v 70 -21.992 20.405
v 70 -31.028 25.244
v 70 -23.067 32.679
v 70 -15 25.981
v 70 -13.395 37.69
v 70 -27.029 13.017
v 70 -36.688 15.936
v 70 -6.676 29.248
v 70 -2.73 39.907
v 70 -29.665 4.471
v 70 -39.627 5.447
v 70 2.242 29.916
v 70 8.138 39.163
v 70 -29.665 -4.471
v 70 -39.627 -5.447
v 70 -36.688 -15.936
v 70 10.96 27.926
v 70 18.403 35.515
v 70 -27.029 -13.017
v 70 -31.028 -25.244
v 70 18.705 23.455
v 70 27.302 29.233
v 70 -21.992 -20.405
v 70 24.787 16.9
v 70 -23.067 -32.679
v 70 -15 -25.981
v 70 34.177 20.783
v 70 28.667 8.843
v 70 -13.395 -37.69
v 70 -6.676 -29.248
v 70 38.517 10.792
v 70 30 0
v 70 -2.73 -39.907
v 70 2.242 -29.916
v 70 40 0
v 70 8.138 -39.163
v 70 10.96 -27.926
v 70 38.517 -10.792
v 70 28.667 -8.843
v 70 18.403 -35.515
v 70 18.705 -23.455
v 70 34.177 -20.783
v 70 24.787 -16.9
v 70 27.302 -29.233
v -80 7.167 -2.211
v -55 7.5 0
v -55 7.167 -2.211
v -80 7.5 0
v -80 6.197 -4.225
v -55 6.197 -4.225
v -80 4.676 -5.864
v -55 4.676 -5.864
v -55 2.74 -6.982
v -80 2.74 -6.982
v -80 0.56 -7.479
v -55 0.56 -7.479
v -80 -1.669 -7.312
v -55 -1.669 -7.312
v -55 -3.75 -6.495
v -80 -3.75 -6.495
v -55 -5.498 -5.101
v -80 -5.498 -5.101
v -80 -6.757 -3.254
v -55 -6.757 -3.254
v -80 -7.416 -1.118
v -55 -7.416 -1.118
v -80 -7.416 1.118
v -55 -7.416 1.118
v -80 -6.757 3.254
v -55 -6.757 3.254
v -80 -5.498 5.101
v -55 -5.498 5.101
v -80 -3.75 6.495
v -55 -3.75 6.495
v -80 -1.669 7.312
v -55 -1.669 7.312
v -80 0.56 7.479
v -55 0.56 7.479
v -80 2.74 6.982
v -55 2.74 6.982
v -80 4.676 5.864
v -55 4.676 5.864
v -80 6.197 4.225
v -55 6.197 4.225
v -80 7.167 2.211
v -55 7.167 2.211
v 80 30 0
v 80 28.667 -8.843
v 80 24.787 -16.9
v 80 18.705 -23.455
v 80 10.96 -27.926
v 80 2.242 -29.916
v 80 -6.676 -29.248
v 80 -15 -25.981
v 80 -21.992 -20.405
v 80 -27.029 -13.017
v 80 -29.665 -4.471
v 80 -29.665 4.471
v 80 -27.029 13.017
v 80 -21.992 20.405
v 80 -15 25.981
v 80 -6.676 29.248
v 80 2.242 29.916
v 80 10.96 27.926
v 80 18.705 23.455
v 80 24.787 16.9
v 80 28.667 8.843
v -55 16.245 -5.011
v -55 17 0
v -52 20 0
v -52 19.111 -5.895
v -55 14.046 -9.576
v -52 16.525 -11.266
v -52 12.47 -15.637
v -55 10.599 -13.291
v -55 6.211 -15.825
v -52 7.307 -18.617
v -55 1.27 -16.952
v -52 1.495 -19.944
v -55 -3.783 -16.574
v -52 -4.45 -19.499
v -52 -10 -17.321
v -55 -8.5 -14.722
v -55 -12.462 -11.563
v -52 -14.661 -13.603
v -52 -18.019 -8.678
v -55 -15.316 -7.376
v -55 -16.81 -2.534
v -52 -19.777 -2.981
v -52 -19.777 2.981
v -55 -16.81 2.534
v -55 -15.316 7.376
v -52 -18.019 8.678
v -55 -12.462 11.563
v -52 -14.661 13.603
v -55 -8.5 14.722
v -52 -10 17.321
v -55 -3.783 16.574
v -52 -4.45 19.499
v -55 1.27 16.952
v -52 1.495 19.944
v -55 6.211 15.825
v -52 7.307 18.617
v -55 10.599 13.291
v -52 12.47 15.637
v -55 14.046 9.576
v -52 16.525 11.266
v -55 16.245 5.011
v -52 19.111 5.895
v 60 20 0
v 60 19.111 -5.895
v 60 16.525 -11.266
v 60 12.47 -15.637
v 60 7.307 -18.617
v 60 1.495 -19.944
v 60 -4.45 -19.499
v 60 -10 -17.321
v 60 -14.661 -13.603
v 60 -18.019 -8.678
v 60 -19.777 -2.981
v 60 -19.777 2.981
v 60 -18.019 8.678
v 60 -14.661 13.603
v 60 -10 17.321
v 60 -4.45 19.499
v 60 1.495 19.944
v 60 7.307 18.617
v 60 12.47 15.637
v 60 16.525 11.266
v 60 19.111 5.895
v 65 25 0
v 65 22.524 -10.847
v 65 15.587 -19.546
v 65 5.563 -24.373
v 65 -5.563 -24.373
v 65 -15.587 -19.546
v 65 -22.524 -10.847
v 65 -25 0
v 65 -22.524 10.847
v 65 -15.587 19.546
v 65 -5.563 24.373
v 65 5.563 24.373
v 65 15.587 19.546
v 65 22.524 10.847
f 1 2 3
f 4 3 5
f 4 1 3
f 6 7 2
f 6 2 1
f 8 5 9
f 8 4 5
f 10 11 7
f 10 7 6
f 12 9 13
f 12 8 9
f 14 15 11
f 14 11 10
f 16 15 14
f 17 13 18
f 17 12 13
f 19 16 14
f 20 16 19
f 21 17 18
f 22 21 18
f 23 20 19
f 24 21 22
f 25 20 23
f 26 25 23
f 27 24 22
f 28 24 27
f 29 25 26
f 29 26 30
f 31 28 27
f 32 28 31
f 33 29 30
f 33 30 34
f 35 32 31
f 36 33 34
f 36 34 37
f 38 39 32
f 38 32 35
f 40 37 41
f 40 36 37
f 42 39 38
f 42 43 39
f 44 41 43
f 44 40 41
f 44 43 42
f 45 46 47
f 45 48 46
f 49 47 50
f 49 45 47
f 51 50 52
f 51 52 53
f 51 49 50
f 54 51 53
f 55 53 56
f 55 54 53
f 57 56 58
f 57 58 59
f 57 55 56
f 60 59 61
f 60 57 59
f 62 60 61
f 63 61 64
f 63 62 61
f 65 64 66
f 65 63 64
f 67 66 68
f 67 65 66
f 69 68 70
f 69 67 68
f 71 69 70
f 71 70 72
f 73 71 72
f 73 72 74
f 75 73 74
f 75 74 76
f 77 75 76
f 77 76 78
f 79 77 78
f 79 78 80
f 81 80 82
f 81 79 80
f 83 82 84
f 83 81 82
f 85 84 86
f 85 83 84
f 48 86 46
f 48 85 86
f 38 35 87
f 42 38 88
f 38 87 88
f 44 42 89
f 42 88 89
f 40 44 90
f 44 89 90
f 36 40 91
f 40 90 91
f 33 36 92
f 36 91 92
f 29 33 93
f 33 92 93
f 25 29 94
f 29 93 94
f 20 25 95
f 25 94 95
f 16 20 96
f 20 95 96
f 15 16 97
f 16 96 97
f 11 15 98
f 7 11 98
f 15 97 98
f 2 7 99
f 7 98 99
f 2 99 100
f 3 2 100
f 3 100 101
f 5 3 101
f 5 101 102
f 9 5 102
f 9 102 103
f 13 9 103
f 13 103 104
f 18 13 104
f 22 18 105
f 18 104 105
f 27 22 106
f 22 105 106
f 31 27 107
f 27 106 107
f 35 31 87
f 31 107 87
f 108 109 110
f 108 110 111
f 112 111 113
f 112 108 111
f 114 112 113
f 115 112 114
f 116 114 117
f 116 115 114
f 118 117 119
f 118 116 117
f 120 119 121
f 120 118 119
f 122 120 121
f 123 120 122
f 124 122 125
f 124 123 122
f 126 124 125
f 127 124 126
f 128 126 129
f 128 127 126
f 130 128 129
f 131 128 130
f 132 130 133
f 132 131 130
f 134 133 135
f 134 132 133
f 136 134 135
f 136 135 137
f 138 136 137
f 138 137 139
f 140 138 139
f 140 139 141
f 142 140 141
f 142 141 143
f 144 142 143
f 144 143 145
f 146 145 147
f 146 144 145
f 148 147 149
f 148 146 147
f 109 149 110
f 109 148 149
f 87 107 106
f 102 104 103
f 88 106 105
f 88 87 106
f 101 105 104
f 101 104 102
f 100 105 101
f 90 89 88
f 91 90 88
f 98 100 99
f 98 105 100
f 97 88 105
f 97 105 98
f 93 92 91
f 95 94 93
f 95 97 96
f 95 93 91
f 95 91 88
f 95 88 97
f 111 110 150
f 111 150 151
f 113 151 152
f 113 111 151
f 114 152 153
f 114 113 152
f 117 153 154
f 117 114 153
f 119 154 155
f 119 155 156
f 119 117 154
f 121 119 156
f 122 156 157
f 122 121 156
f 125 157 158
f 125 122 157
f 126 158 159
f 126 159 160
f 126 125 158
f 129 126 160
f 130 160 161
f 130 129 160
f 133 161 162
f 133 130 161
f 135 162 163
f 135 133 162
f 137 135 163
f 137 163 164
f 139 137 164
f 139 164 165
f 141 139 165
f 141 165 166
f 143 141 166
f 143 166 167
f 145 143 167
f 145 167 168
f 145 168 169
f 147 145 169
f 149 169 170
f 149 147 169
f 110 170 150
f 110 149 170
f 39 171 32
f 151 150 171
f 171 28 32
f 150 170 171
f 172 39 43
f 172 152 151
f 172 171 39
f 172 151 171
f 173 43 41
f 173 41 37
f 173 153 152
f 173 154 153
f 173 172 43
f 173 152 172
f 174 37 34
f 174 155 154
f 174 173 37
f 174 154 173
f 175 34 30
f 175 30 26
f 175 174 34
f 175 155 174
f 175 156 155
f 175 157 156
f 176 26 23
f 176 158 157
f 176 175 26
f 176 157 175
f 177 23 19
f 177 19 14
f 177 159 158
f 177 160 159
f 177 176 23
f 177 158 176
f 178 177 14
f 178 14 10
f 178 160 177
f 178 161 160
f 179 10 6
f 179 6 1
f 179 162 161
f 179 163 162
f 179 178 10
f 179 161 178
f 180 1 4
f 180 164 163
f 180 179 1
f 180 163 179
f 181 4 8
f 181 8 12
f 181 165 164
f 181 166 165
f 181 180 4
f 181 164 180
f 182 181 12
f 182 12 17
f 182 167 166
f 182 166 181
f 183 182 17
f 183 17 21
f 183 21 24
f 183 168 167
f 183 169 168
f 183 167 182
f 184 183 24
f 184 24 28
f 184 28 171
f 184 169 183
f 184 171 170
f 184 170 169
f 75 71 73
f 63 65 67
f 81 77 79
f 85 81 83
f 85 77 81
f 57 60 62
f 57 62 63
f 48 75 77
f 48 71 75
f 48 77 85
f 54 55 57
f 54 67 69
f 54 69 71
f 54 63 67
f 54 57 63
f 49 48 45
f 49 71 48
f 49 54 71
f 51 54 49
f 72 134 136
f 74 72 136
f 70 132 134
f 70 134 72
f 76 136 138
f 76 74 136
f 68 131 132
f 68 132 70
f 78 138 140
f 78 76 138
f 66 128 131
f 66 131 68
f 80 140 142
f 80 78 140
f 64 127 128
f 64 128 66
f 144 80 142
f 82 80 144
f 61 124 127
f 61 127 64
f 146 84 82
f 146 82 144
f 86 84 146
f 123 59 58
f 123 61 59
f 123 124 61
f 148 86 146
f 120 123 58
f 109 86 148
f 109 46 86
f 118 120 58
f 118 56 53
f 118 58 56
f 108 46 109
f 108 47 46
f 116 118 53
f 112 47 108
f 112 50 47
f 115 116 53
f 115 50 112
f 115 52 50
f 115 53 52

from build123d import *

# Parameters (mm, degrees)
F2_SIZE2 = 10
F2_SIZE  = 10
F3_SIZE2 = 9.99999
F3_SIZE  = 9.99999
F4_SIZE2 = 3
F4_SIZE  = 3


# Not quite as in the source:
# - a fillet or chamfer is up to 0.001 mm smaller than in the source, because OpenCascade refuses the exact size


with BuildPart() as f1:
    # F0 (on Top) → F1 (revolve)
    with BuildSketch(Plane.XY):
        Polygon((-80, 7.5), (-80, 0), (80, 0), (80, 40), (70, 40), (70, 20), (-55, 20), (-55, 7.5), align=None)
    revolve(axis=Axis((0, 0, 0), (-1, 0, 0)))

    # F2
    f2_edges = [f1.edges().sort_by_distance(p)[0] for p in [
        (70, -20, 0),
    ]]
    chamfer(f2_edges, length=F2_SIZE, length2=F2_SIZE2)

    # F3 (size 10 and 10 in the source; OpenCascade refuses exactly that, so slightly less here)
    f3_edges = [f1.edges().sort_by_distance(p)[0] for p in [
        (80, -40, 0),
    ]]
    chamfer(f3_edges, length=F3_SIZE, length2=F3_SIZE2)

    # F4
    f4_edges = [f1.edges().sort_by_distance(p)[0] for p in [
        (-55, -20, 0),
    ]]
    chamfer(f4_edges, length=F4_SIZE, length2=F4_SIZE2)


solid = f1.part
